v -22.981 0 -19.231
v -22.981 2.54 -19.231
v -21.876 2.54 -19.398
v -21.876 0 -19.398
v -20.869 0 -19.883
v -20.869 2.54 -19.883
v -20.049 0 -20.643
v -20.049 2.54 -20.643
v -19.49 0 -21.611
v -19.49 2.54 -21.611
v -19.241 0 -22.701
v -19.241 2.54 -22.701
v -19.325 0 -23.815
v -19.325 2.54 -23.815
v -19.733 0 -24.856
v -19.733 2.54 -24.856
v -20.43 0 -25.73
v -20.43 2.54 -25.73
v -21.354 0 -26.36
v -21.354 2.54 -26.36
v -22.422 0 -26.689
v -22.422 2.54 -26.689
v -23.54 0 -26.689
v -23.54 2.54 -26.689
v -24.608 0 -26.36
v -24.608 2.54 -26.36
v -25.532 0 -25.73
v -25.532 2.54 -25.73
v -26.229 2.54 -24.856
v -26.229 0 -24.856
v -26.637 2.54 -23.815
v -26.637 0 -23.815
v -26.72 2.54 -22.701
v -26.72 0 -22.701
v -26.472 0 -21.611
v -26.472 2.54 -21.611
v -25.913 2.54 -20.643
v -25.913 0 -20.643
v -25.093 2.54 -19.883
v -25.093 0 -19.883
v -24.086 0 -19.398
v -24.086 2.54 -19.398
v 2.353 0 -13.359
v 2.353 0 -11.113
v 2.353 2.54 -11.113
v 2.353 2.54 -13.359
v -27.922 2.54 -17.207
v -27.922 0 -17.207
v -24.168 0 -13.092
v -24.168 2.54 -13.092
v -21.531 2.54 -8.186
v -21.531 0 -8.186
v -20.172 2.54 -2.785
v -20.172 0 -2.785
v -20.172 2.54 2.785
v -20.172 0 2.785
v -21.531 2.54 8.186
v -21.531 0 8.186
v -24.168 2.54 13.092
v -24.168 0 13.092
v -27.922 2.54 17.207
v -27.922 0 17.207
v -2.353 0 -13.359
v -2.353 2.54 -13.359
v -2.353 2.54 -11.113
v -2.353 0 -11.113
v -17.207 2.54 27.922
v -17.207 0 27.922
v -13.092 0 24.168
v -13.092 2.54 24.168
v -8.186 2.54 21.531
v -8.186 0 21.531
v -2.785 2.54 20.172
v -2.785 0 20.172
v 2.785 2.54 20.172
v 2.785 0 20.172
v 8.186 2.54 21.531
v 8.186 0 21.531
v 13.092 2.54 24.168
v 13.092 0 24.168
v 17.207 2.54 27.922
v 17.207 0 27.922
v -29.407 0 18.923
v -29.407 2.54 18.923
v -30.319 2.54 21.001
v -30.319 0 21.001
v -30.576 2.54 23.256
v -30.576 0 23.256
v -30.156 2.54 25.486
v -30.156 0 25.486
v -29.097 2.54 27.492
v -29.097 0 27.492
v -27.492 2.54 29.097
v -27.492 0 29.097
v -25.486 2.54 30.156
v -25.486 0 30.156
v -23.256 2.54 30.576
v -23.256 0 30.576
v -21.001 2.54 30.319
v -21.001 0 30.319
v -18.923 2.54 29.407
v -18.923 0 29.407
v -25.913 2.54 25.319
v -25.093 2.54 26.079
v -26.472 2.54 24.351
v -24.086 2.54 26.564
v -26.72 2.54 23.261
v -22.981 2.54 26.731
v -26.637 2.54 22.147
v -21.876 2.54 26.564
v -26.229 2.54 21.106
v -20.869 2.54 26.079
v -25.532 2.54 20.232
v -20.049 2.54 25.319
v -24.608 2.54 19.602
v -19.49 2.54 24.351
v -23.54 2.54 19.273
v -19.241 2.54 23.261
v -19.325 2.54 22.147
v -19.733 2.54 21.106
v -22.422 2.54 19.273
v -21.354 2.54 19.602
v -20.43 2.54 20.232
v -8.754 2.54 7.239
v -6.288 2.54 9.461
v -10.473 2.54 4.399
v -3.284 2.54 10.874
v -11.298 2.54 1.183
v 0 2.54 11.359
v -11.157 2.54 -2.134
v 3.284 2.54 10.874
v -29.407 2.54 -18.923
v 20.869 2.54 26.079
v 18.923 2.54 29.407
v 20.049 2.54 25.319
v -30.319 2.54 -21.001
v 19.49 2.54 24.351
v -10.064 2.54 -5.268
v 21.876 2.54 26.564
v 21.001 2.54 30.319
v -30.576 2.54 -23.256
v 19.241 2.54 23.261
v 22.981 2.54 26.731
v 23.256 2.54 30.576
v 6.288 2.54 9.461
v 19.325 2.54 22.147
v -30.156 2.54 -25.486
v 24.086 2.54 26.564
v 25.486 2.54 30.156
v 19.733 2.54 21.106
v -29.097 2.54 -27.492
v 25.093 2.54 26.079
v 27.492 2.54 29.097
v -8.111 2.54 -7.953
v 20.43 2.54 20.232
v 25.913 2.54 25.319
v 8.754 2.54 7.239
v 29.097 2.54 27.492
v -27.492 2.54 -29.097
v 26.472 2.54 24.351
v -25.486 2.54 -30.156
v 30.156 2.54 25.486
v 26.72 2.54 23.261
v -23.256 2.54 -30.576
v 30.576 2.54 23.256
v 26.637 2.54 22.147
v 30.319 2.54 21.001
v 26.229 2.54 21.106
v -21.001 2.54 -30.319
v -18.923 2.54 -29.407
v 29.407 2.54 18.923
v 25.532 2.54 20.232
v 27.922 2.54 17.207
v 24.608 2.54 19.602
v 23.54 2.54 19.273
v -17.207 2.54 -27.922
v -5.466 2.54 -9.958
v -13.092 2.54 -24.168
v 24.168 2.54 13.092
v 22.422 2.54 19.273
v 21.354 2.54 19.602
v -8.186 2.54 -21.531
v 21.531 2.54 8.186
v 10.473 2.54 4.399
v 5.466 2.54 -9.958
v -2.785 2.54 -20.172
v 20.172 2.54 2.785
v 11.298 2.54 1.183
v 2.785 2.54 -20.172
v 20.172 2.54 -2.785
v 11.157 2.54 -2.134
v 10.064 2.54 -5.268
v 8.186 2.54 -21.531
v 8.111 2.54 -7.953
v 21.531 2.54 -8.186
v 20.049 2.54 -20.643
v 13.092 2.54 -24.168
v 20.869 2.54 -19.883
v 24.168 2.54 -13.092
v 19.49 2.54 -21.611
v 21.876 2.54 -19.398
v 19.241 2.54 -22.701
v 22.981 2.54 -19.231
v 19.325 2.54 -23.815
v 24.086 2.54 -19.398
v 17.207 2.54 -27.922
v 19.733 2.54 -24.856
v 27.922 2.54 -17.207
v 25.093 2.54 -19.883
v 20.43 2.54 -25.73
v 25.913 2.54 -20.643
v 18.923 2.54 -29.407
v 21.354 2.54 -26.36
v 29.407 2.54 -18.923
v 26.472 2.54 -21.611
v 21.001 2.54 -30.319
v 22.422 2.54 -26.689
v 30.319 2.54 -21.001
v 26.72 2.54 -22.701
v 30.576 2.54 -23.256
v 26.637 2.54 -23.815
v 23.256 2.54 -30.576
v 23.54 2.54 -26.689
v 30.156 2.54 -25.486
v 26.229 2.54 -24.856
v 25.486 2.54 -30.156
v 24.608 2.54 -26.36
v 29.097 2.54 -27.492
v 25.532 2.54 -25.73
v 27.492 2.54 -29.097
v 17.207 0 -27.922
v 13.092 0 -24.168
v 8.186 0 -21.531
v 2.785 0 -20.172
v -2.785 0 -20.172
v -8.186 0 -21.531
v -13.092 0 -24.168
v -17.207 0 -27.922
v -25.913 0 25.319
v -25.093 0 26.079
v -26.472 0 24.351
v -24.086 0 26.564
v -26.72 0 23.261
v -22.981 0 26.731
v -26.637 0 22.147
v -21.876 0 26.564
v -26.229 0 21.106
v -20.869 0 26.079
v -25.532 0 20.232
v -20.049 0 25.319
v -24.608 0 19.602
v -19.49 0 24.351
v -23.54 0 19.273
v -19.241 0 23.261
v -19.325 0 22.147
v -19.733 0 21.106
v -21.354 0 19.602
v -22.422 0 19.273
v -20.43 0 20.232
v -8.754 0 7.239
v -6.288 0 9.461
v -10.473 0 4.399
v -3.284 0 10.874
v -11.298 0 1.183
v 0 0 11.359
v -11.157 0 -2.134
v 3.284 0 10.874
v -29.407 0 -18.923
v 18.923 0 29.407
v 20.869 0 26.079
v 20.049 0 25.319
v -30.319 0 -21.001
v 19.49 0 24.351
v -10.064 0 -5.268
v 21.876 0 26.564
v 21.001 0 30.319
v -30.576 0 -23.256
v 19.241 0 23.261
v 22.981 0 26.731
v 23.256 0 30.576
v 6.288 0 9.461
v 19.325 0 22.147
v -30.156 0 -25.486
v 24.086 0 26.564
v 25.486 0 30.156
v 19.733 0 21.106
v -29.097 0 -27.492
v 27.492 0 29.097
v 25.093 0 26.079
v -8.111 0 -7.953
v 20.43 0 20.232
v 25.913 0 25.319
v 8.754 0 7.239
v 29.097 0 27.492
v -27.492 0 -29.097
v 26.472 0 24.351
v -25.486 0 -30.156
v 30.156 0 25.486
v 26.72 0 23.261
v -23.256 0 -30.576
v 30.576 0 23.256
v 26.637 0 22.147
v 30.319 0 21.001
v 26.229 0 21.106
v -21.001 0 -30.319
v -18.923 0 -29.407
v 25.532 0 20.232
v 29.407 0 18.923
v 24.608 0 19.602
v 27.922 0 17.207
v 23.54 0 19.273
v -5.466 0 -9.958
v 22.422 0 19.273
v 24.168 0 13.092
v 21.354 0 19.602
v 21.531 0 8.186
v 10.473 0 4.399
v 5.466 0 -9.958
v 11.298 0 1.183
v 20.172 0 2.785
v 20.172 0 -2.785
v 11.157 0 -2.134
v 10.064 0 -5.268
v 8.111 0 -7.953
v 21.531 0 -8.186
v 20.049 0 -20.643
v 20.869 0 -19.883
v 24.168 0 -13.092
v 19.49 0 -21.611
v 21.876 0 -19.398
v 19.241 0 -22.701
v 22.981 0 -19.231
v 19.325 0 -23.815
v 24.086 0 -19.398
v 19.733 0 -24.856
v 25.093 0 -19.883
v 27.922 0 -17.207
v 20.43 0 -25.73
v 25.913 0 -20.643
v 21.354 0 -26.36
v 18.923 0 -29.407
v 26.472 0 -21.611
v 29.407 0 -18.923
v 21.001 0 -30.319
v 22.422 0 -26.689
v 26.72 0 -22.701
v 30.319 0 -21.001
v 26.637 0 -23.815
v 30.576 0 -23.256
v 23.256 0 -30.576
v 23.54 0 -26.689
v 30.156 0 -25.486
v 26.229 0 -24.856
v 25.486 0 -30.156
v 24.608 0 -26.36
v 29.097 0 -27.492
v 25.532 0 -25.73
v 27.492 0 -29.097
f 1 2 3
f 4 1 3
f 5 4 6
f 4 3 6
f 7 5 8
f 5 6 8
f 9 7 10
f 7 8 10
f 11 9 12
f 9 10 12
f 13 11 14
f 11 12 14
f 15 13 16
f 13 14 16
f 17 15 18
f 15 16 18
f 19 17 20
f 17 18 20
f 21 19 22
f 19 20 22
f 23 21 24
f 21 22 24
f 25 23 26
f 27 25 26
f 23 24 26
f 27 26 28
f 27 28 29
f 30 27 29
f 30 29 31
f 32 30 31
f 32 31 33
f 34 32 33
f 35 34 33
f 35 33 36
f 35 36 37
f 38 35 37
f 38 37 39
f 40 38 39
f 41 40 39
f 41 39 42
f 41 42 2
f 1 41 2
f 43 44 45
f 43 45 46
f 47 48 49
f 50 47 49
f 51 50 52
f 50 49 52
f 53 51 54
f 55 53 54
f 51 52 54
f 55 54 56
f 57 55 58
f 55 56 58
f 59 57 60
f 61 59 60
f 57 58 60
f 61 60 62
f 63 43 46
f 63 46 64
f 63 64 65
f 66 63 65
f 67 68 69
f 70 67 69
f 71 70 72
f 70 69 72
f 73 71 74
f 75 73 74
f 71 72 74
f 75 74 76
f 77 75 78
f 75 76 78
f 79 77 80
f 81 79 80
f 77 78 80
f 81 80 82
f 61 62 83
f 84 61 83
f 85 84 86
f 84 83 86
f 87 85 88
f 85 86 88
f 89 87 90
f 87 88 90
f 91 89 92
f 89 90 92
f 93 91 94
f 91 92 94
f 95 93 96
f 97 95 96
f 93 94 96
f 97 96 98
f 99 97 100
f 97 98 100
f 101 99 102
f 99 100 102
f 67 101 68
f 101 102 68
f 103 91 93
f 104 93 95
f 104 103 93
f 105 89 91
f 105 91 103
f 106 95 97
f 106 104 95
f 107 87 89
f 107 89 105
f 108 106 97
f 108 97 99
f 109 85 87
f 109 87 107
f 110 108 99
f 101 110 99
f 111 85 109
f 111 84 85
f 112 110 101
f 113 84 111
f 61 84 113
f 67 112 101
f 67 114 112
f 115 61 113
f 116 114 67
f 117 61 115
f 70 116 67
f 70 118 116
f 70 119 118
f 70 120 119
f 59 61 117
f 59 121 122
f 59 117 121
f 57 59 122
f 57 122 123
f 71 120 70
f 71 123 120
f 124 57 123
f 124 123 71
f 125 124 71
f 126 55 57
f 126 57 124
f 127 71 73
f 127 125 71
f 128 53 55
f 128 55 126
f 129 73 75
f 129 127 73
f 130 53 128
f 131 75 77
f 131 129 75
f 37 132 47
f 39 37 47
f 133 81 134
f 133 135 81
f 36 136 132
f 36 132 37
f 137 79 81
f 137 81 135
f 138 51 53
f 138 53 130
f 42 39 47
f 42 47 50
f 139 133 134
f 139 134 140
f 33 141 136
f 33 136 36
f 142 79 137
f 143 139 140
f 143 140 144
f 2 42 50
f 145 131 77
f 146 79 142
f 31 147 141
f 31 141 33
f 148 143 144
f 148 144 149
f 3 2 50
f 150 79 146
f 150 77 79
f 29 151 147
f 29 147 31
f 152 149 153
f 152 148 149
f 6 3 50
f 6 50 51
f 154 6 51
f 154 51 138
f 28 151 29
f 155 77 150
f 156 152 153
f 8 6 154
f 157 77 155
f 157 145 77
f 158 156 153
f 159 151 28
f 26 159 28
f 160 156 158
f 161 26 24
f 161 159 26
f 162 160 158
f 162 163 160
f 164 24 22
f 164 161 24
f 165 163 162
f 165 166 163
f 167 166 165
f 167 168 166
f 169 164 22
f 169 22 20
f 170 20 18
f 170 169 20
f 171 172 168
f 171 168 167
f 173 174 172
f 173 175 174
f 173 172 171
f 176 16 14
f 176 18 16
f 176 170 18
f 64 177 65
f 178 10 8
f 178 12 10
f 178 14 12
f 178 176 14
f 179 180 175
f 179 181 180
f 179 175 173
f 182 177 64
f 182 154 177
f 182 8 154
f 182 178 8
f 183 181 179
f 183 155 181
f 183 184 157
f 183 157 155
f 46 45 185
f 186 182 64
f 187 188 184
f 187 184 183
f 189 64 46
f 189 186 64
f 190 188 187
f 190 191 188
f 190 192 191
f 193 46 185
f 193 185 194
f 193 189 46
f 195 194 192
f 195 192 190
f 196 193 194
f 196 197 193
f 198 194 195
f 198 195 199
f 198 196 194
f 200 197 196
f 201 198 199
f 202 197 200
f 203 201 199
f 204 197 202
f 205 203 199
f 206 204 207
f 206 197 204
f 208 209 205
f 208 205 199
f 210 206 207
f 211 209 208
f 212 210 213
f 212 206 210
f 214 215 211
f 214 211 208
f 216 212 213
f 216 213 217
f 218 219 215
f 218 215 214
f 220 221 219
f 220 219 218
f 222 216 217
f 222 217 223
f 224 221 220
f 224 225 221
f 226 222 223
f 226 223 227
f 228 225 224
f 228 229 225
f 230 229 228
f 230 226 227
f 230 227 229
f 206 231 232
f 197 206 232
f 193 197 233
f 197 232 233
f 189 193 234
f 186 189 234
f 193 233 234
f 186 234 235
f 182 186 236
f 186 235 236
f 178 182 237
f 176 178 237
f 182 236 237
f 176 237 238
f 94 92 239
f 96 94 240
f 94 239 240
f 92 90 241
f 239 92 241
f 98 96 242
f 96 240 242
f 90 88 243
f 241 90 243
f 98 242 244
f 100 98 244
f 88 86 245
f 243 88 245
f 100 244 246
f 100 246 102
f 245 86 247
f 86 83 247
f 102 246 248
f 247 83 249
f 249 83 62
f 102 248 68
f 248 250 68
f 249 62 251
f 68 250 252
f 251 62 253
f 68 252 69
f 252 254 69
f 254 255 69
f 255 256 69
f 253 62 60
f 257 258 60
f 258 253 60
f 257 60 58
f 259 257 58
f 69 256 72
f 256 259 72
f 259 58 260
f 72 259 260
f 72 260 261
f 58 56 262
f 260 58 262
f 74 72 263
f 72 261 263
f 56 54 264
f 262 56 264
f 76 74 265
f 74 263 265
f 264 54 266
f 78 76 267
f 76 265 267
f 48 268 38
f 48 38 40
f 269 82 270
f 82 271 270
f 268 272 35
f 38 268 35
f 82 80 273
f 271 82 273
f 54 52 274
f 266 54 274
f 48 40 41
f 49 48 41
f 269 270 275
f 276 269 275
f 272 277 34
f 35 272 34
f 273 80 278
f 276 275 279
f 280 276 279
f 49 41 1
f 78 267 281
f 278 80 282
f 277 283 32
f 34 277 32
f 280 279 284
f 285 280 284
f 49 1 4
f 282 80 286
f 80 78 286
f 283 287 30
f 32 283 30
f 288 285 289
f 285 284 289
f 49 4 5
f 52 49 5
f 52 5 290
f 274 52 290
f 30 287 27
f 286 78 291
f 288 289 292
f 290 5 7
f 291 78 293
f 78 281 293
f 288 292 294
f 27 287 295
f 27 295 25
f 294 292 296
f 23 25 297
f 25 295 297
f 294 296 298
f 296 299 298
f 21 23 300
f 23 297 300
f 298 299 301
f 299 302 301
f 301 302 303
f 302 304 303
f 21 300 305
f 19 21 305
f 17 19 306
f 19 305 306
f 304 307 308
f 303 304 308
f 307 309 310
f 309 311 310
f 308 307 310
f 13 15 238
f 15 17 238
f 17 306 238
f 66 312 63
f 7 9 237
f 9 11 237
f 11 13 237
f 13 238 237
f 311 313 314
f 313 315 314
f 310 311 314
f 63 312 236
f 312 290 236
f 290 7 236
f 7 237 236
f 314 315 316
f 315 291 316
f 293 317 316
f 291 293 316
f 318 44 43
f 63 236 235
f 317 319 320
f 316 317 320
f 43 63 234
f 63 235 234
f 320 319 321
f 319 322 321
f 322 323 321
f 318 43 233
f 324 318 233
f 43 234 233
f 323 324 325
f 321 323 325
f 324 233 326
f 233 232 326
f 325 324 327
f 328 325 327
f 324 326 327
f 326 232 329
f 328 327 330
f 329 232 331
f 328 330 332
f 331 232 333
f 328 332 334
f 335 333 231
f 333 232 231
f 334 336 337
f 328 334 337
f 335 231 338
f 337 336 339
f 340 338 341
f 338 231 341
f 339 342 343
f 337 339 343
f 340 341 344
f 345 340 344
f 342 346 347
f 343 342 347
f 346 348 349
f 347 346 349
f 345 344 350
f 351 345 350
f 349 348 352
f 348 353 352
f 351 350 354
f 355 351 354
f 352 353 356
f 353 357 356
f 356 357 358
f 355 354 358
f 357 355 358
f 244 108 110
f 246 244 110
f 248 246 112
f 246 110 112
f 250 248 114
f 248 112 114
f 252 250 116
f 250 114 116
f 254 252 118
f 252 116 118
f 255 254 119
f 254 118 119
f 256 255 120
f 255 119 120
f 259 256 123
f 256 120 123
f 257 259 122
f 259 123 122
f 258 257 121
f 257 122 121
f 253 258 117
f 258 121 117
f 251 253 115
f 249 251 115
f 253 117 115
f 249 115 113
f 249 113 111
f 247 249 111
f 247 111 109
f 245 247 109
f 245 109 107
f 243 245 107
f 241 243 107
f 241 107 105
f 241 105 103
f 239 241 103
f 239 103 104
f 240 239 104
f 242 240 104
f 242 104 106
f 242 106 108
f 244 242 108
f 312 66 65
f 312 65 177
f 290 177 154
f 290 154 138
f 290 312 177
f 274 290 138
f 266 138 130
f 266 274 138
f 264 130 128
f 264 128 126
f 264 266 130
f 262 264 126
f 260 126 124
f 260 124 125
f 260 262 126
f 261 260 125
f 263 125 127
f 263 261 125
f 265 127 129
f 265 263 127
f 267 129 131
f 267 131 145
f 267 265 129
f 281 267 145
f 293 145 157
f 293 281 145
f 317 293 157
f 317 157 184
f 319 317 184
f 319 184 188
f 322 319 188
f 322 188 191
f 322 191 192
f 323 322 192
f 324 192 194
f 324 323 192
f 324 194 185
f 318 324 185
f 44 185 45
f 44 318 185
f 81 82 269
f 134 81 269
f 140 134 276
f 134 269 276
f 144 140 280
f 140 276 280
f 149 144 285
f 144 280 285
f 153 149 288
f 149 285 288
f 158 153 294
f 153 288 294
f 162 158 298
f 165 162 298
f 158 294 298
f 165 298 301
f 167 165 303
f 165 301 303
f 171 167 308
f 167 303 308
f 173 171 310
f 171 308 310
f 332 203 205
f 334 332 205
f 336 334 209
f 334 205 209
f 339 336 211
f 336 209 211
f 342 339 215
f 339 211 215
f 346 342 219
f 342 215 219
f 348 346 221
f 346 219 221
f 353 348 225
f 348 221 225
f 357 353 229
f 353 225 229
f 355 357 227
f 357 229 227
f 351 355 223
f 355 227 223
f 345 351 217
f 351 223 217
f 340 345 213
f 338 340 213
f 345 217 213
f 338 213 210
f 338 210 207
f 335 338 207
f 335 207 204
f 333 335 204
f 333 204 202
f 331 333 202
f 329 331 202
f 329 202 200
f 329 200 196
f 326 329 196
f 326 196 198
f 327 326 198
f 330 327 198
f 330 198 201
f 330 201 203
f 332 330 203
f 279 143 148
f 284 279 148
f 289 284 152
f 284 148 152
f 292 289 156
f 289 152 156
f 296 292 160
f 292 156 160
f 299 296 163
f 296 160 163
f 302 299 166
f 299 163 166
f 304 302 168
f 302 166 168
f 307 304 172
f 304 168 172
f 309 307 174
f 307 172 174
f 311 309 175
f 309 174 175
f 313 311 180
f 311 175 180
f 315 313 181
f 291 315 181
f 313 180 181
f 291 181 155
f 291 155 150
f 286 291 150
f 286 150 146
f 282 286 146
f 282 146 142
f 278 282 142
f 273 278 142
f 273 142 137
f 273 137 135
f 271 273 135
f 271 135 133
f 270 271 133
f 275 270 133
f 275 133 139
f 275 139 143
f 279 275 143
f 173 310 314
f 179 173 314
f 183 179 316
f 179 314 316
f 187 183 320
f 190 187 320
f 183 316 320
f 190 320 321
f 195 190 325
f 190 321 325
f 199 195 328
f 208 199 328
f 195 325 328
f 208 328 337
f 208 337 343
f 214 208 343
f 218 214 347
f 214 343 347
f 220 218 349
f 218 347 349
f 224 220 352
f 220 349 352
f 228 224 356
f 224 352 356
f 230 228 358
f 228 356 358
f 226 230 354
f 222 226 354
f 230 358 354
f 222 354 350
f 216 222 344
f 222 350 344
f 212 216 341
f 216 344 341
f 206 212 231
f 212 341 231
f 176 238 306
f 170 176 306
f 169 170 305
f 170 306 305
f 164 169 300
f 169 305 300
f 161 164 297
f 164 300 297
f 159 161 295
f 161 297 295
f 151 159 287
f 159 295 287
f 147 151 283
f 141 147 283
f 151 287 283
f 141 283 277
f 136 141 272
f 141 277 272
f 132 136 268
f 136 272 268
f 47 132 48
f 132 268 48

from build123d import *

# Parameters (mm, degrees)
SKETCH1_R           = 2.6
BOSS_EXTRUDE1_DEPTH = 2.54
SKETCH2_R           = 3.75
SKETCH2_R_2         = 2.6
CUT_EXTRUDE1_DEPTH  = 44.322547245


with BuildPart() as part:
    # Sketch1 → Boss-Extrude1 (new body)
    with BuildSketch(Plane(origin=(0, 0, 0), x_dir=(1, 0, 0), z_dir=(0, 1, 0))):
        with BuildLine():
            ThreePointArc((-17.206636662, 27.922333563), (-28.354981926, 28.354981926), (-27.922333563, 17.206636662))
            ThreePointArc((-27.922333563, 17.206636662), (-20, 0), (-27.922333563, -17.206636662))
            ThreePointArc((-27.922333563, -17.206636662), (-28.354981926, -28.354981926), (-17.206636662, -27.922333563))
            ThreePointArc((-17.206636662, -27.922333563), (0, -20), (17.206636662, -27.922333563))
            ThreePointArc((17.206636662, -27.922333563), (28.354981926, -28.354981926), (27.922333563, -17.206636662))
            ThreePointArc((27.922333563, -17.206636662), (20, 0), (27.922333563, 17.206636662))
            ThreePointArc((27.922333563, 17.206636662), (28.354981926, 28.354981926), (17.206636662, 27.922333563))
            ThreePointArc((17.206636662, 27.922333563), (0, 20), (-17.206636662, 27.922333563))
        make_face()
        with Locations(Location((22.980970389, 22.980970389, 0), (0, 0, 270))):
            Circle(SKETCH1_R, mode=Mode.SUBTRACT)
        with Locations(Location((22.980970389, -22.980970389, 0), (0, 0, 270))):
            Circle(SKETCH1_R, mode=Mode.SUBTRACT)
        with Locations(Location((-22.980970389, -22.980970389, 0), (0, 0, 270))):
            Circle(SKETCH1_R, mode=Mode.SUBTRACT)
        with Locations(Location((-22.980970389, 22.980970389, 0), (0, 0, 270))):
            Circle(SKETCH1_R, mode=Mode.SUBTRACT)
        with BuildLine():
            Line((2.353261567, 13.359444444), (-2.353261567, 13.359444444))
            Line((-2.353261567, 13.359444444), (-2.353261567, 11.113016606))
            ThreePointArc((-2.353261567, 11.113016606), (0, -11.359444444), (2.353261567, 11.113016606))
            Line((2.353261567, 11.113016606), (2.353261567, 13.359444444))
        make_face(mode=Mode.SUBTRACT)
    extrude(amount=BOSS_EXTRUDE1_DEPTH)

    # Sketch2 → Cut-Extrude1 (cut, through all)
    # profile 1 of 4: a face of its own
    with BuildSketch(Plane(origin=(0, 2.54, 0), x_dir=(1, 0, 0), z_dir=(0, 1, 0))):
        with Locations(Location((-22.980970389, 22.980970389, 0), (0, 0, 270))):
            Circle(SKETCH2_R)
        with Locations((-22.980970389, 22.980970389)):
            Circle(SKETCH2_R_2, mode=Mode.SUBTRACT)
    # profile 2 of 4: a face of its own
    with BuildSketch(Plane(origin=(0, 2.54, 0), x_dir=(1, 0, 0), z_dir=(0, 1, 0))):
        with Locations(Location((22.980970389, 22.980970389, 0), (0, 0, 270))):
            Circle(SKETCH2_R)
        with Locations((22.980970389, 22.980970389)):
            Circle(SKETCH2_R_2, mode=Mode.SUBTRACT)
    # profile 3 of 4: a face of its own
    with BuildSketch(Plane(origin=(0, 2.54, 0), x_dir=(1, 0, 0), z_dir=(0, 1, 0))):
        with Locations(Location((22.980970389, -22.980970389, 0), (0, 0, 270))):
            Circle(SKETCH2_R)
        with Locations((22.980970389, -22.980970389)):
            Circle(SKETCH2_R_2, mode=Mode.SUBTRACT)
    # profile 4 of 4: a face of its own
    with BuildSketch(Plane(origin=(0, 2.54, 0), x_dir=(1, 0, 0), z_dir=(0, 1, 0))):
        with Locations(Location((-22.980970389, -22.980970389, 0), (0, 0, 270))):
            Circle(SKETCH2_R)
        with Locations((-22.980970389, -22.980970389)):
            Circle(SKETCH2_R_2, mode=Mode.SUBTRACT)
    extrude(amount=-CUT_EXTRUDE1_DEPTH, mode=Mode.SUBTRACT)


solid = part.part
